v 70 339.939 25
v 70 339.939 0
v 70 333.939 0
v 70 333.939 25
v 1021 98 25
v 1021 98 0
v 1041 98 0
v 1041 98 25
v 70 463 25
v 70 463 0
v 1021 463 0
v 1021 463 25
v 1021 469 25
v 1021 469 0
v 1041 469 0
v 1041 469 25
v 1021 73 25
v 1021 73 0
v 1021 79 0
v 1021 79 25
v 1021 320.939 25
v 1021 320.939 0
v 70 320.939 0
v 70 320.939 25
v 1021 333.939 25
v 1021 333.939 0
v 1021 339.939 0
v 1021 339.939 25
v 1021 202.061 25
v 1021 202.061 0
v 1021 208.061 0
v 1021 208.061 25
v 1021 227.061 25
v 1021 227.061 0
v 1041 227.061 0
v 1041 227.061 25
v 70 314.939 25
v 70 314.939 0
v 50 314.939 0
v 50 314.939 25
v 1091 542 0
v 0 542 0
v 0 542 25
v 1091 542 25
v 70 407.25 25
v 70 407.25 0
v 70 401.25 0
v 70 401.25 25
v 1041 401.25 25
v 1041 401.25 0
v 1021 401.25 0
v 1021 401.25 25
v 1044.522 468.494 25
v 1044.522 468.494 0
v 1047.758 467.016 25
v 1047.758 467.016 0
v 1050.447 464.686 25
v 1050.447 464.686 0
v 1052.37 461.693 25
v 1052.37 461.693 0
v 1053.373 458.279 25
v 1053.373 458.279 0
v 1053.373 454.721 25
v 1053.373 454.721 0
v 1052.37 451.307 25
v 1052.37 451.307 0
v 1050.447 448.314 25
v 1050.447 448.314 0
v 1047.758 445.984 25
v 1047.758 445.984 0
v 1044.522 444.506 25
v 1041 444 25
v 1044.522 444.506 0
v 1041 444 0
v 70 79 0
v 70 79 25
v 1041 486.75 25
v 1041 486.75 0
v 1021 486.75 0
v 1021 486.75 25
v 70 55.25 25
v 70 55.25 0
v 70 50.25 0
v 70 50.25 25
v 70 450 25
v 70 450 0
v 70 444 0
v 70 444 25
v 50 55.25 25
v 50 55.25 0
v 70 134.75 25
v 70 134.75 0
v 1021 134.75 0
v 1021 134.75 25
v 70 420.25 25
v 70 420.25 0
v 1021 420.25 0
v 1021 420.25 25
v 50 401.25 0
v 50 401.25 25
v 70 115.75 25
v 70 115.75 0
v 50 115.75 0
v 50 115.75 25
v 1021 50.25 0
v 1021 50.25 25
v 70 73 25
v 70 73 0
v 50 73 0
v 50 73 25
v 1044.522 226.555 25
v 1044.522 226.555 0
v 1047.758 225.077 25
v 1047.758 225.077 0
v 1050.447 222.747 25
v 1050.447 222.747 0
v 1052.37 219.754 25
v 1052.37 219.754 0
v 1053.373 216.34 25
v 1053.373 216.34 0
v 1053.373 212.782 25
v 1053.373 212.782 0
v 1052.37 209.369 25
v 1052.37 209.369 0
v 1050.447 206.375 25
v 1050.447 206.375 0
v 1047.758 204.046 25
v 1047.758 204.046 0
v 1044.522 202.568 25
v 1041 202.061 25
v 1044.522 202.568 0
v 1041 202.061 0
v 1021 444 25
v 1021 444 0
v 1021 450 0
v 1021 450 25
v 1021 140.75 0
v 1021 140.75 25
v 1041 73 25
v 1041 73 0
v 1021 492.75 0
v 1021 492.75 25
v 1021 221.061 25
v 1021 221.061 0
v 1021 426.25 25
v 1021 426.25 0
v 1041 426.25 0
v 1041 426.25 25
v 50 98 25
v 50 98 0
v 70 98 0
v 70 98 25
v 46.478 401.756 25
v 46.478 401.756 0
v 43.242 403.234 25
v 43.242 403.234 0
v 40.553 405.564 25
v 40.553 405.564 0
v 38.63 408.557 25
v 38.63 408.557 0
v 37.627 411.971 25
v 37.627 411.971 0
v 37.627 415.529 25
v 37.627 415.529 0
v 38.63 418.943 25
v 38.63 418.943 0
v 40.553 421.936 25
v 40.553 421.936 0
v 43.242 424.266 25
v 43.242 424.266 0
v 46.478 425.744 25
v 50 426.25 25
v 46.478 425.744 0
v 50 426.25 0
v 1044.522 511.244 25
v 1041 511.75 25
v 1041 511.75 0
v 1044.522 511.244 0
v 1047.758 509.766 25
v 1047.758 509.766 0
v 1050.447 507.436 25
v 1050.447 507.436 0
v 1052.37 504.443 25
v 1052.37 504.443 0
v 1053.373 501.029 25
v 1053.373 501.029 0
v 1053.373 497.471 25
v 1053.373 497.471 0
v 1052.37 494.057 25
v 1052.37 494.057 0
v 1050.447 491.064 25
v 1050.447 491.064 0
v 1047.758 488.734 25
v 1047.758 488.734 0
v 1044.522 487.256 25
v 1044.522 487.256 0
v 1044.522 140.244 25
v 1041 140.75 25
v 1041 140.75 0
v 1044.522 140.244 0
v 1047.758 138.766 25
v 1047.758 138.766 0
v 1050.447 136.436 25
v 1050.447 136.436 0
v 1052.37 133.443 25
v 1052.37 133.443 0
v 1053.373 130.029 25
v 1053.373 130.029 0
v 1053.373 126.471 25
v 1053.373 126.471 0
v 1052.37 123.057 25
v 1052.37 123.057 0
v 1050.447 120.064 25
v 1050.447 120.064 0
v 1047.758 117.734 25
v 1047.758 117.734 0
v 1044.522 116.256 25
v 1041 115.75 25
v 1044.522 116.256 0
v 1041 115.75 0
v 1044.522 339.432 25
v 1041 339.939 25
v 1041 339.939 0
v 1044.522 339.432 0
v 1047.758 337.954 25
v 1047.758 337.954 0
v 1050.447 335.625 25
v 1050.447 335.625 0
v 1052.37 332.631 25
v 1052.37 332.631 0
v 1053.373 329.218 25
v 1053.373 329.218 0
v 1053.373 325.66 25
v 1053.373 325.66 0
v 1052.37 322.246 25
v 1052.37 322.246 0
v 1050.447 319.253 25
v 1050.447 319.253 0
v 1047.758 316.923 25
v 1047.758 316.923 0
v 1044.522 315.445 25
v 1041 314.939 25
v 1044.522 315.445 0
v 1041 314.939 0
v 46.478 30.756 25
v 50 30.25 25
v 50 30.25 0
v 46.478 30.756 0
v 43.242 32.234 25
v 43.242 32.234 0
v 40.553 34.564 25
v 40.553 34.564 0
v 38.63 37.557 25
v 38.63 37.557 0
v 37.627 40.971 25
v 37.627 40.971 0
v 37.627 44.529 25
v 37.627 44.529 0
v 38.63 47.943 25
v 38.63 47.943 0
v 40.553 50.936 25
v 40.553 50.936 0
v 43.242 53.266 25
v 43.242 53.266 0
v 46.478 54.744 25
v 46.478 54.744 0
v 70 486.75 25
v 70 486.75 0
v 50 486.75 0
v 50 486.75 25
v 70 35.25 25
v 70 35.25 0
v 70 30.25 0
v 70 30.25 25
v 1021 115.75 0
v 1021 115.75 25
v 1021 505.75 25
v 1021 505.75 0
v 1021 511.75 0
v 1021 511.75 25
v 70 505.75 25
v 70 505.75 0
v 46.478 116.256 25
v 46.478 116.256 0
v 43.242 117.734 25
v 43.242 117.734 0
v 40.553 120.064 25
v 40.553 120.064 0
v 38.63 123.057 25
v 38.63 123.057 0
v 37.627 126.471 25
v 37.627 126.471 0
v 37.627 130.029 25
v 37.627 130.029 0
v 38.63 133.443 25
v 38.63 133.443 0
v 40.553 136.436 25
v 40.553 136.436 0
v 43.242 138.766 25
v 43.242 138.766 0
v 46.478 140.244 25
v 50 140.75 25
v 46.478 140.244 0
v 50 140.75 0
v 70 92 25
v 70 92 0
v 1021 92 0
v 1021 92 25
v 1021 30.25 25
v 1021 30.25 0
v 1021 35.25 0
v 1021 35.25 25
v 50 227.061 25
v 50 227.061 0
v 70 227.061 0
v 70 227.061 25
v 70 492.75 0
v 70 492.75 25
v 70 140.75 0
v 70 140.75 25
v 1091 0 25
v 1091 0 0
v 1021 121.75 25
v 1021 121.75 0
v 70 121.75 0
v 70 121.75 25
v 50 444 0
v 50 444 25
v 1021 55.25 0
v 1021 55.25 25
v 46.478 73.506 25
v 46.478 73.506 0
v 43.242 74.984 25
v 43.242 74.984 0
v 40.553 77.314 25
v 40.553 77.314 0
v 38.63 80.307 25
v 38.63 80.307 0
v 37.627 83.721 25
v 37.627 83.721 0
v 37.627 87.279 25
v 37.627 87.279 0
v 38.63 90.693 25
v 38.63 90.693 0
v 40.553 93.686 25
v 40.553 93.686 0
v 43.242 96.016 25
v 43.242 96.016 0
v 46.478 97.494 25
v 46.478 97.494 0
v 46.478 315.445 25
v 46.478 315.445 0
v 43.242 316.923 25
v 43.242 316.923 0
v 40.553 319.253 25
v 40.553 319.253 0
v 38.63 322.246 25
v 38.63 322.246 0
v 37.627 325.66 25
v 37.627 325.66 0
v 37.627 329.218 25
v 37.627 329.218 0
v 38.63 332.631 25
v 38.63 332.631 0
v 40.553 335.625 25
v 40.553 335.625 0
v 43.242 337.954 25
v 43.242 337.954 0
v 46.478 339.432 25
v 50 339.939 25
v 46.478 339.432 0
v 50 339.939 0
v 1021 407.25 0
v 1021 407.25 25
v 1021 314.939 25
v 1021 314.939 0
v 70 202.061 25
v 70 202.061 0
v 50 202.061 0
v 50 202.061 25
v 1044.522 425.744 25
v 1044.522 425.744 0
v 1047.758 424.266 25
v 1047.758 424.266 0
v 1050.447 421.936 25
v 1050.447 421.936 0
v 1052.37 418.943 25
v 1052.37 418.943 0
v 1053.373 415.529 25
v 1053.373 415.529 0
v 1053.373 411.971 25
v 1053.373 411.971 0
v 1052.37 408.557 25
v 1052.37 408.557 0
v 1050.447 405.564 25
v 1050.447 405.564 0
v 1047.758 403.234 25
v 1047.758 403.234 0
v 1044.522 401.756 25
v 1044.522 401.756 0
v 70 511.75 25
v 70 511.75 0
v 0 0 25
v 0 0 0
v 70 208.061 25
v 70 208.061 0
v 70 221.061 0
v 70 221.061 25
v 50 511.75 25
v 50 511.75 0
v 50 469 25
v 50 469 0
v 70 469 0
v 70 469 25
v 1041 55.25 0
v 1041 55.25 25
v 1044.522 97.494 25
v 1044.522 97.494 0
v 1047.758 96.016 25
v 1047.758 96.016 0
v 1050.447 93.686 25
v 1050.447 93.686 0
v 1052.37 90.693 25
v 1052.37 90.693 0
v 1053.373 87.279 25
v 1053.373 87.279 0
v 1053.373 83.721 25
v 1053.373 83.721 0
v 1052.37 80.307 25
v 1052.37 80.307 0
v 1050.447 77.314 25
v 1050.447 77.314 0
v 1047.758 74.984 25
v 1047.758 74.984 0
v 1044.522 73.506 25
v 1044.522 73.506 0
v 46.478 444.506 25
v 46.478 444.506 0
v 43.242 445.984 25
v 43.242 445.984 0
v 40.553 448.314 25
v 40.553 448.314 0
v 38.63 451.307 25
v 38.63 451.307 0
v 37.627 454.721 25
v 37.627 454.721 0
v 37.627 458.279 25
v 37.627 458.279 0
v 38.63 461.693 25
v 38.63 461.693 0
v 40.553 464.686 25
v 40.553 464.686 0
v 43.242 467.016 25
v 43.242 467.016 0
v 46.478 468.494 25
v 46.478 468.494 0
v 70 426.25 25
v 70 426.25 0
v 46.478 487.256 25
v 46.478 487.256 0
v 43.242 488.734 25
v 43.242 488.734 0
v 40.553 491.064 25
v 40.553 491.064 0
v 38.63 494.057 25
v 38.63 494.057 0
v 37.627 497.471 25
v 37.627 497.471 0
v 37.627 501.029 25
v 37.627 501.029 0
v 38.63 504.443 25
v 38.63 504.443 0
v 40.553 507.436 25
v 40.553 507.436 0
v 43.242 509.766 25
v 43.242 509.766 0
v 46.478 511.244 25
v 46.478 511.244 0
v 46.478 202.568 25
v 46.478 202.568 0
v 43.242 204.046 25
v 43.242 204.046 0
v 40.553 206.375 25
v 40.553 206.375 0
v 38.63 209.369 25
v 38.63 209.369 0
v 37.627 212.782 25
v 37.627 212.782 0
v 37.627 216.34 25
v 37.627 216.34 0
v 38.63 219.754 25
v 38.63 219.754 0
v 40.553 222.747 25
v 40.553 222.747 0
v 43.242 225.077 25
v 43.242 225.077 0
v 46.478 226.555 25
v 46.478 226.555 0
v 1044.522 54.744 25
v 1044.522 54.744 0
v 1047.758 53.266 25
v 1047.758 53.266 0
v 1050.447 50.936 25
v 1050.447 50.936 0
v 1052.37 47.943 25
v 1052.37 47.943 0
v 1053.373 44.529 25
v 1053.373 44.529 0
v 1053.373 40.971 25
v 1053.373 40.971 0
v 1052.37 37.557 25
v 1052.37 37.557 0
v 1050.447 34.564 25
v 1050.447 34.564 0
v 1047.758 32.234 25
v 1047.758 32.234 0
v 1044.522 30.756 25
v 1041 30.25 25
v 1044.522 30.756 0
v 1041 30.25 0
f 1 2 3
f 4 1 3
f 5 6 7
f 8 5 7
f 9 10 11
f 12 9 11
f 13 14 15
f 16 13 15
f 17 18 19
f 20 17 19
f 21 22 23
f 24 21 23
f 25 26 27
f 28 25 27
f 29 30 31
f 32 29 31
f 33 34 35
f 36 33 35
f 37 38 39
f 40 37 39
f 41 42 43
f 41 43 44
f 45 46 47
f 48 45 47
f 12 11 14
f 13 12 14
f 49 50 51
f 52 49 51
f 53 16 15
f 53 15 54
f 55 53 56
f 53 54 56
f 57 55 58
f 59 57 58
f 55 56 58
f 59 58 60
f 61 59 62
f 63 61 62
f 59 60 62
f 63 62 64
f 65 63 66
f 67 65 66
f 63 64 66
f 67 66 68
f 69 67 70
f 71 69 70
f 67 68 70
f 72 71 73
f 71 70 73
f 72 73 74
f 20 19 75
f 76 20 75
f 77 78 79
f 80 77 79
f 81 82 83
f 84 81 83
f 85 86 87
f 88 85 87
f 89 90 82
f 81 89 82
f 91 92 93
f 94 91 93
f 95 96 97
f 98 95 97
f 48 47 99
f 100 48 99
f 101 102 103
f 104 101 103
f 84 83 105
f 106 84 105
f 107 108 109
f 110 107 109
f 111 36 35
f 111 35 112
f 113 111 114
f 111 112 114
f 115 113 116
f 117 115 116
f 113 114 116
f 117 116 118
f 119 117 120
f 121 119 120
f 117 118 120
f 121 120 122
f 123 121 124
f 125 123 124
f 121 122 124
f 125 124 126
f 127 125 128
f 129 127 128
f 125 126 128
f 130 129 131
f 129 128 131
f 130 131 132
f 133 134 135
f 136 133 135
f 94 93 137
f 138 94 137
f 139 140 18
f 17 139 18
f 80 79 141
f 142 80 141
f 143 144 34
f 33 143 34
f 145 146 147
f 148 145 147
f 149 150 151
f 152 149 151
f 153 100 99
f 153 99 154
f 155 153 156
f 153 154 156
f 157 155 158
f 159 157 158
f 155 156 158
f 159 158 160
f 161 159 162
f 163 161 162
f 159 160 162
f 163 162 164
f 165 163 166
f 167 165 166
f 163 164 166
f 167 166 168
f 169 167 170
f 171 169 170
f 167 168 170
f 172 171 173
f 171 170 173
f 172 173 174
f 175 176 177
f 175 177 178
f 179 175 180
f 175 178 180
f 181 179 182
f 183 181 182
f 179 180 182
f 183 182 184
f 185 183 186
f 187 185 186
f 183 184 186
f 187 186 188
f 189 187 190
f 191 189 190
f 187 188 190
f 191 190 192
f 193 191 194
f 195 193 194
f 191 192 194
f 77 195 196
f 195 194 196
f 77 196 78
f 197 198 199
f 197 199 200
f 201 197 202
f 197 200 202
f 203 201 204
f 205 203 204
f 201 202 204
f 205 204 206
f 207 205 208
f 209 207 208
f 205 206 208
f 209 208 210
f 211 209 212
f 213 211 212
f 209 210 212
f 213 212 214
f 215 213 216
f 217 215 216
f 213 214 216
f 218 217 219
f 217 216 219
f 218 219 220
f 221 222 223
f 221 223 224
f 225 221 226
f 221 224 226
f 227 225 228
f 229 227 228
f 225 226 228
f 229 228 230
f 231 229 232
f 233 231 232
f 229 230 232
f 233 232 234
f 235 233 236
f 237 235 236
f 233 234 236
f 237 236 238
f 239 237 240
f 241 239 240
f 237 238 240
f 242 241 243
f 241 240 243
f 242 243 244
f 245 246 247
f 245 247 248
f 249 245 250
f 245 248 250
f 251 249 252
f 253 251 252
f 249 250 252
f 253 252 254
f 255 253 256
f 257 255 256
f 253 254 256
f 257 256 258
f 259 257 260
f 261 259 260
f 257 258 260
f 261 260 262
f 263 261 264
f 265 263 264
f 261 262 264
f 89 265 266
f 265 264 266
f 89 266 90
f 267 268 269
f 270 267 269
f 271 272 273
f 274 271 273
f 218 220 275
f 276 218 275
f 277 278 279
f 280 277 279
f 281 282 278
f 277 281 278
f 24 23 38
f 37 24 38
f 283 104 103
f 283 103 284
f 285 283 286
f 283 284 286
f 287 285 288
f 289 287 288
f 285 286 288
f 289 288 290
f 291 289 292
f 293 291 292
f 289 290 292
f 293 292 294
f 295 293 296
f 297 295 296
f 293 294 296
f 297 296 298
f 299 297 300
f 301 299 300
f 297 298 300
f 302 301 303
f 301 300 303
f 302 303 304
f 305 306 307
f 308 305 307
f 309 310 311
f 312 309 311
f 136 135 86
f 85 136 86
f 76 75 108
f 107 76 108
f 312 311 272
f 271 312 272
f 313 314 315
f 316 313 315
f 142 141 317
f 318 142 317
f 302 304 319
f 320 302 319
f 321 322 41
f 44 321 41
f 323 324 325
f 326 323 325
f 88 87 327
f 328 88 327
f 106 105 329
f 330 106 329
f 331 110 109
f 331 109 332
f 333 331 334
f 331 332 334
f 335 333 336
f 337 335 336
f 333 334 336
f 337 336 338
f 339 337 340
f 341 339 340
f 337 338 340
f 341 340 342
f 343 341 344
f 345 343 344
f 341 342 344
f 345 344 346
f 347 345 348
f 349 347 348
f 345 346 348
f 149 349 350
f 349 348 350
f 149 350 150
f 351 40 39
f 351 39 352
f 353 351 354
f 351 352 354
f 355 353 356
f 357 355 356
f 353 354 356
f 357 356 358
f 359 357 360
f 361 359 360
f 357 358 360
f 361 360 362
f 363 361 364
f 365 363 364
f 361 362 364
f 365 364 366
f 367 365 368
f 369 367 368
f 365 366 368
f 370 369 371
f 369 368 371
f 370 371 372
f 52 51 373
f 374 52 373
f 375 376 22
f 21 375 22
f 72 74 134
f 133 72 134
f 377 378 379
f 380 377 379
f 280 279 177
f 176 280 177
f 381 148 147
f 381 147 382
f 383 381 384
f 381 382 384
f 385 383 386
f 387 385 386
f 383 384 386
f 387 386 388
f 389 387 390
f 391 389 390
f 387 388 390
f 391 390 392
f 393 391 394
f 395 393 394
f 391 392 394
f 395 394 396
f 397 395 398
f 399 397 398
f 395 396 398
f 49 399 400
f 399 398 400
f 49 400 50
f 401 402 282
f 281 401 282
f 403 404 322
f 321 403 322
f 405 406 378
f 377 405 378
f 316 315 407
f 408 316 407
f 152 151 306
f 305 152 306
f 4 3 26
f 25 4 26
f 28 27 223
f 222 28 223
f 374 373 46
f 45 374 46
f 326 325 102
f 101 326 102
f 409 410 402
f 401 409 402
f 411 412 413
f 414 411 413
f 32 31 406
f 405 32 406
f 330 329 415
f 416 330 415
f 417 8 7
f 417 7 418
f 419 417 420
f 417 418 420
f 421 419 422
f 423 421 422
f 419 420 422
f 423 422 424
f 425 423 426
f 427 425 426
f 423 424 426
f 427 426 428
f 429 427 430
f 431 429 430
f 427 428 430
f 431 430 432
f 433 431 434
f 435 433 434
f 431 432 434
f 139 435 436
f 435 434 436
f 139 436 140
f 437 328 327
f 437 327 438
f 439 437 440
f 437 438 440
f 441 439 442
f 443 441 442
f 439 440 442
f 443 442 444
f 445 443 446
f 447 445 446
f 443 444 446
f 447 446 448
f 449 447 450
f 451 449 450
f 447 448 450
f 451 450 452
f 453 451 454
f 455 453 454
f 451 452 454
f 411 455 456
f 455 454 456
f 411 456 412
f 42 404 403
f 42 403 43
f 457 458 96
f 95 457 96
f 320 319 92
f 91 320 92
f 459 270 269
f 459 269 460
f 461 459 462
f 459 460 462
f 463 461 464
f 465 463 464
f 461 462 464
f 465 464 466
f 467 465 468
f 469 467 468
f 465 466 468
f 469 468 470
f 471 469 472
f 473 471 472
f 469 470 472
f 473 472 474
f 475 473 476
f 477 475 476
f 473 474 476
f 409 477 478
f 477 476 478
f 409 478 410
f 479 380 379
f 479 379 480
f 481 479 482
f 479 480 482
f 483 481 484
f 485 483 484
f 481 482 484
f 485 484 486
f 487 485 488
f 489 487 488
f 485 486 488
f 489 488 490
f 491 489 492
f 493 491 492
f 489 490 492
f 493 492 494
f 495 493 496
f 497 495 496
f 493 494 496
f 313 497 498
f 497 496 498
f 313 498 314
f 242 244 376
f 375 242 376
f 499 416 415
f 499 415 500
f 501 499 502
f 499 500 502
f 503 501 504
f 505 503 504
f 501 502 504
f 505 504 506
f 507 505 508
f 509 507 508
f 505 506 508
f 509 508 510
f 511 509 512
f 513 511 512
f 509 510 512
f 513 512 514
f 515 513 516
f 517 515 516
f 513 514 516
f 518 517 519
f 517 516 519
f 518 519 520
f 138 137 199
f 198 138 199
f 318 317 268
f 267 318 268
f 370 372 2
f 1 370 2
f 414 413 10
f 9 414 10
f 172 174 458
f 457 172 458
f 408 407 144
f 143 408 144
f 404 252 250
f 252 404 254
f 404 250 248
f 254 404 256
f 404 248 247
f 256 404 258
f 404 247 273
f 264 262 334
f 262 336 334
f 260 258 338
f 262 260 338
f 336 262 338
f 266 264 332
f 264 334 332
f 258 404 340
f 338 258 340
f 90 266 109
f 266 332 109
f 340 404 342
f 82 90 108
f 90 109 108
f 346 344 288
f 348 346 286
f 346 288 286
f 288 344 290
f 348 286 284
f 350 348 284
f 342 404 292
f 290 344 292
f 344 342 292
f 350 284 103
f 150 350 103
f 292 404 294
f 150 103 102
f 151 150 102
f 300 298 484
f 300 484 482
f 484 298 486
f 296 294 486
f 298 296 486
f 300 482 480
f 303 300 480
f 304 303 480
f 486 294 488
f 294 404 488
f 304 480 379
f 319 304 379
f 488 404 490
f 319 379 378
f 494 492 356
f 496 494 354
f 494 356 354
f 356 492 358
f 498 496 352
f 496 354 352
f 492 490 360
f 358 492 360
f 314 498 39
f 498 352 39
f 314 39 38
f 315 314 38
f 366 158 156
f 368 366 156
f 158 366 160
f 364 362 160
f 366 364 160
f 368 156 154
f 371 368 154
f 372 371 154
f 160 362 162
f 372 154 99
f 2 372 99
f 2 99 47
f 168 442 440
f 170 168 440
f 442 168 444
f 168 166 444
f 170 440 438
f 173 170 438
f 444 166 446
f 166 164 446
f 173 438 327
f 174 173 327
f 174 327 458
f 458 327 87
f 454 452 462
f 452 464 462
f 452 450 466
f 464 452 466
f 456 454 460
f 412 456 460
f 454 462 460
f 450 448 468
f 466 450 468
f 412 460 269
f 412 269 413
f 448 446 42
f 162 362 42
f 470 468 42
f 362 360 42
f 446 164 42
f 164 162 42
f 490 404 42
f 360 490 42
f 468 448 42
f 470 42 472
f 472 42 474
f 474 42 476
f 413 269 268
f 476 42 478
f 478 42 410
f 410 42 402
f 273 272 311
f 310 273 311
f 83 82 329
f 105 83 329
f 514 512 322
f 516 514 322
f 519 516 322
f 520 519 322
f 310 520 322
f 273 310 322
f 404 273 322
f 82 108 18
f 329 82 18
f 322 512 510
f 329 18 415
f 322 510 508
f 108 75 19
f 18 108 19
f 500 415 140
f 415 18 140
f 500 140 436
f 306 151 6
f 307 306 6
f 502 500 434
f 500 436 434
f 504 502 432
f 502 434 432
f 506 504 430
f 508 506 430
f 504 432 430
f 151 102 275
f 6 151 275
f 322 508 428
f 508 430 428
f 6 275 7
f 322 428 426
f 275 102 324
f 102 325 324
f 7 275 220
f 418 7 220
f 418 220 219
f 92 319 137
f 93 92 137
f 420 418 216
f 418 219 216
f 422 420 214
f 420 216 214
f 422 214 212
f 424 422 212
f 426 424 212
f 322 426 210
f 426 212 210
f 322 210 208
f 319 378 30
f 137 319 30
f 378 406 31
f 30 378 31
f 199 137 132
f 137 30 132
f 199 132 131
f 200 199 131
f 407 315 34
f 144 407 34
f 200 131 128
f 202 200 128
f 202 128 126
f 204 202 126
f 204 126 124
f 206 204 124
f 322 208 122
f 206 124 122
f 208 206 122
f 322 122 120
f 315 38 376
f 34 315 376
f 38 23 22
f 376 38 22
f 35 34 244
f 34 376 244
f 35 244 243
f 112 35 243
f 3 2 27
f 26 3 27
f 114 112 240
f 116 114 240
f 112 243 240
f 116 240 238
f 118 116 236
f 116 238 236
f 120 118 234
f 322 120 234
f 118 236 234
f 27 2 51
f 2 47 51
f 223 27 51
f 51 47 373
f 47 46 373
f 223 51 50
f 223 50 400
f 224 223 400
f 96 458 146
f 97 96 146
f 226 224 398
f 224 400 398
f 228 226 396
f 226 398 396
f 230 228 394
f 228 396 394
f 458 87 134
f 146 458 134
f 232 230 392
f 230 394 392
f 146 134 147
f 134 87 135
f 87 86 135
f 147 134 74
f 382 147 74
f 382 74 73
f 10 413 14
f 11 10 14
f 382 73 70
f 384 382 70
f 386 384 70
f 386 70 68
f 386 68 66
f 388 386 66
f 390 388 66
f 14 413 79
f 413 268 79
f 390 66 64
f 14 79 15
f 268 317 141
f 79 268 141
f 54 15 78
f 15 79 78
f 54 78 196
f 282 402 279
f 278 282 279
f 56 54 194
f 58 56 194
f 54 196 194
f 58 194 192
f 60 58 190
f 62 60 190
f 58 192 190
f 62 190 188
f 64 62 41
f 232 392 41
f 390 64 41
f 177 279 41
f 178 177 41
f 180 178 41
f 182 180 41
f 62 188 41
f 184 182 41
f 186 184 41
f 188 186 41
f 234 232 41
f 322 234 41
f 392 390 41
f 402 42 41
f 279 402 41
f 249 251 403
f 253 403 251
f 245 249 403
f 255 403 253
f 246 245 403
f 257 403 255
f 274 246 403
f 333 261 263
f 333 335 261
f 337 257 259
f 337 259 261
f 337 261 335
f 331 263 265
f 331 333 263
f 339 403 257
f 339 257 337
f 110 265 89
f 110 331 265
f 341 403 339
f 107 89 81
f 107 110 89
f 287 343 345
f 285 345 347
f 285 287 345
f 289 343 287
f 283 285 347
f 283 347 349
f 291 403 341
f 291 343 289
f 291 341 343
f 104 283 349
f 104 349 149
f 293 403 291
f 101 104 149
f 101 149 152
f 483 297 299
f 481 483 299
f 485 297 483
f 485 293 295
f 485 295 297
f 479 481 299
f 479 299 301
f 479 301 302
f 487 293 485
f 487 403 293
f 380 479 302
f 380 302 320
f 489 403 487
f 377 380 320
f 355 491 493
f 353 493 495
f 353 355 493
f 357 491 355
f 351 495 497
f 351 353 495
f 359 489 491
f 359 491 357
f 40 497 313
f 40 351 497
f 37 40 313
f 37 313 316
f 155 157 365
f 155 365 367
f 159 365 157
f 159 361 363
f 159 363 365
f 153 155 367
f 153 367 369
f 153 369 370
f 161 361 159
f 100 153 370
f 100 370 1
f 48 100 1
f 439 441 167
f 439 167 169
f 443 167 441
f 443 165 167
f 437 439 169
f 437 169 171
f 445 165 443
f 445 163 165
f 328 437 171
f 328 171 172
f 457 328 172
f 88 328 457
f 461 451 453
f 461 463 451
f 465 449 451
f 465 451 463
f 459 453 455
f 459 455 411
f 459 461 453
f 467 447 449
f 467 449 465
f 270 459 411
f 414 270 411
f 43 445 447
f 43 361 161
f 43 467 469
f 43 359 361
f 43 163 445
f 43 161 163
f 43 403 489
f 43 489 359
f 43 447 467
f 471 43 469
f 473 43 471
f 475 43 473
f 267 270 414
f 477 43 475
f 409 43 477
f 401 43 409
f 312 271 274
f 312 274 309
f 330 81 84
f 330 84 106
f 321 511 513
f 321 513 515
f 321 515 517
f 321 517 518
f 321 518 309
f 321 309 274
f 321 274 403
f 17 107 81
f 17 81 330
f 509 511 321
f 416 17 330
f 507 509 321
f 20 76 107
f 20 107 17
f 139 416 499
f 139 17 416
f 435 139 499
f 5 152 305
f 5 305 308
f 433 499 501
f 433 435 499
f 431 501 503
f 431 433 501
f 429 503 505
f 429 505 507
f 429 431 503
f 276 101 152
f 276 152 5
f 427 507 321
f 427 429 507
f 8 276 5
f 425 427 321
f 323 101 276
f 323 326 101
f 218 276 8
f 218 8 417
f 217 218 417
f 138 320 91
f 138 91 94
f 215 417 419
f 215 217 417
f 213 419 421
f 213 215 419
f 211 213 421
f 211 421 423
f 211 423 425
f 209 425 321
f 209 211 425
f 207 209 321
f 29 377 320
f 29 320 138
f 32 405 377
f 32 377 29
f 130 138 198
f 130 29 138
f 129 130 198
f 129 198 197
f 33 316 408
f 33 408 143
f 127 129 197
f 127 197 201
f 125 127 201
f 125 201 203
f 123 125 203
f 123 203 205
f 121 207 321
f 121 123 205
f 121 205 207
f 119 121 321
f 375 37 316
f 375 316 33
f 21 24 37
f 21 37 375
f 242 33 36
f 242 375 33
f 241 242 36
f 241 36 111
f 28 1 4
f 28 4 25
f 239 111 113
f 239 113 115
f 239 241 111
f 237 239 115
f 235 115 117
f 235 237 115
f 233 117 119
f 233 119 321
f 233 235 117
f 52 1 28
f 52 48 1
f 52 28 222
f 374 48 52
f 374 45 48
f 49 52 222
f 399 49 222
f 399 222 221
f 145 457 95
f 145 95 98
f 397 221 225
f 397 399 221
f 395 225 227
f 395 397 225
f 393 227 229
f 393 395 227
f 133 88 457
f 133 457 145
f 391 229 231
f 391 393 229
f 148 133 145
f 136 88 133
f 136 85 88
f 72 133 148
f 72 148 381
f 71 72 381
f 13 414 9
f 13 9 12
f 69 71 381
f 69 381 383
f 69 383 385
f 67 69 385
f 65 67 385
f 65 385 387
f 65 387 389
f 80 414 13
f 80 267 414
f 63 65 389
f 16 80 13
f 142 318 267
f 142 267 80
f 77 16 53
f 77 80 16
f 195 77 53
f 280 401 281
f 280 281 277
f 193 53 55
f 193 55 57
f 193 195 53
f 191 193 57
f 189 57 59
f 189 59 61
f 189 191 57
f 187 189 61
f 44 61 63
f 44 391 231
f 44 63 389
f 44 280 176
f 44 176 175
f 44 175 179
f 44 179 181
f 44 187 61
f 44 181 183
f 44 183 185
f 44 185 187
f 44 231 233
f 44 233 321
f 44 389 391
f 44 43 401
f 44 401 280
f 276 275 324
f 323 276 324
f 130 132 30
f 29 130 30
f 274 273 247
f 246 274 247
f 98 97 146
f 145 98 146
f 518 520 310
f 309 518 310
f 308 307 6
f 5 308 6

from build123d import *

# Parameters (mm, degrees)
F1_W     = 1091
F1_H     = 542
F2_DEPTH = 25


with BuildPart() as f2:
    # F1 (on face) → F2 (new body)
    with BuildSketch(Plane.XY):
        with Locations((545.5, 271)):
            Rectangle(F1_W, F1_H)
        with BuildLine():
            Line((70, 30.25), (50, 30.25))
            ThreePointArc((50, 30.25), (37.5, 42.75), (50, 55.25))
            Line((50, 55.25), (70, 55.25))
            Line((70, 55.25), (70, 50.25))
            Line((70, 50.25), (1021, 50.25))
            Line((1021, 50.25), (1021, 55.25))
            Line((1021, 55.25), (1041, 55.25))
            ThreePointArc((1041, 55.25), (1053.5, 42.75), (1041, 30.25))
            Line((1041, 30.25), (1021, 30.25))
            Line((1021, 30.25), (1021, 35.25))
            Line((1021, 35.25), (70, 35.25))
            Line((70, 35.25), (70, 30.25))
        make_face(mode=Mode.SUBTRACT)
        with BuildLine():
            Line((70, 73), (50, 73))
            ThreePointArc((50, 73), (37.5, 85.5), (50, 98))
            Line((50, 98), (70, 98))
            Line((70, 98), (70, 92))
            Line((70, 92), (1021, 92))
            Line((1021, 92), (1021, 98))
            Line((1021, 98), (1041, 98))
            ThreePointArc((1041, 98), (1053.5, 85.5), (1041, 73))
            Line((1041, 73), (1021, 73))
            Line((1021, 73), (1021, 79))
            Line((1021, 79), (70, 79))
            Line((70, 79), (70, 73))
        make_face(mode=Mode.SUBTRACT)
        with BuildLine():
            Line((70, 115.75), (50, 115.75))
            ThreePointArc((50, 115.75), (37.5, 128.25), (50, 140.75))
            Line((50, 140.75), (70, 140.75))
            Line((70, 140.75), (70, 134.75))
            Line((70, 134.75), (1021, 134.75))
            Line((1021, 134.75), (1021, 140.75))
            Line((1021, 140.75), (1041, 140.75))
            ThreePointArc((1041, 140.75), (1053.5, 128.25), (1041, 115.75))
            Line((1041, 115.75), (1021, 115.75))
            Line((1021, 115.75), (1021, 121.75))
            Line((1021, 121.75), (70, 121.75))
            Line((70, 121.75), (70, 115.75))
        make_face(mode=Mode.SUBTRACT)
        with BuildLine():
            Line((70, 202.061247), (50, 202.061247))
            ThreePointArc((50, 202.061247), (37.5, 214.561247), (50, 227.061247))
            Line((50, 227.061247), (70, 227.061247))
            Line((70, 227.061247), (70, 221.061247))
            Line((70, 221.061247), (1021, 221.061247))
            Line((1021, 221.061247), (1021, 227.061247))
            Line((1021, 227.061247), (1041, 227.061247))
            ThreePointArc((1041, 227.061247), (1053.5, 214.561247), (1041, 202.061247))
            Line((1041, 202.061247), (1021, 202.061247))
            Line((1021, 202.061247), (1021, 208.061247))
            Line((1021, 208.061247), (70, 208.061247))
            Line((70, 208.061247), (70, 202.061247))
        make_face(mode=Mode.SUBTRACT)
        with BuildLine():
            Line((70, 314.938753), (50, 314.938753))
            ThreePointArc((50, 314.938753), (37.5, 327.438753), (50, 339.938753))
            Line((50, 339.938753), (70, 339.938753))
            Line((70, 339.938753), (70, 333.938753))
            Line((70, 333.938753), (1021, 333.938753))
            Line((1021, 333.938753), (1021, 339.938753))
            Line((1021, 339.938753), (1041, 339.938753))
            ThreePointArc((1041, 339.938753), (1053.5, 327.438753), (1041, 314.938753))
            Line((1041, 314.938753), (1021, 314.938753))
            Line((1021, 314.938753), (1021, 320.938753))
            Line((1021, 320.938753), (70, 320.938753))
            Line((70, 320.938753), (70, 314.938753))
        make_face(mode=Mode.SUBTRACT)
        with BuildLine():
            Line((70, 401.25), (50, 401.25))
            ThreePointArc((50, 401.25), (37.5, 413.75), (50, 426.25))
            Line((50, 426.25), (70, 426.25))
            Line((70, 426.25), (70, 420.25))
            Line((70, 420.25), (1021, 420.25))
            Line((1021, 420.25), (1021, 426.25))
            Line((1021, 426.25), (1041, 426.25))
            ThreePointArc((1041, 426.25), (1053.5, 413.75), (1041, 401.25))
            Line((1041, 401.25), (1021, 401.25))
            Line((1021, 401.25), (1021, 407.25))
            Line((1021, 407.25), (70, 407.25))
            Line((70, 407.25), (70, 401.25))
        make_face(mode=Mode.SUBTRACT)
        with BuildLine():
            Line((70, 444), (50, 444))
            ThreePointArc((50, 444), (37.5, 456.5), (50, 469))
            Line((50, 469), (70, 469))
            Line((70, 469), (70, 463))
            Line((70, 463), (1021, 463))
            Line((1021, 463), (1021, 469))
            Line((1021, 469), (1041, 469))
            ThreePointArc((1041, 469), (1053.5, 456.5), (1041, 444))
            Line((1041, 444), (1021, 444))
            Line((1021, 444), (1021, 450))
            Line((1021, 450), (70, 450))
            Line((70, 450), (70, 444))
        make_face(mode=Mode.SUBTRACT)
        with BuildLine():
            Line((70, 486.75), (50, 486.75))
            ThreePointArc((50, 486.75), (37.5, 499.25), (50, 511.75))
            Line((50, 511.75), (70, 511.75))
            Line((70, 511.75), (70, 505.75))
            Line((70, 505.75), (1021, 505.75))
            Line((1021, 505.75), (1021, 511.75))
            Line((1021, 511.75), (1041, 511.75))
            ThreePointArc((1041, 511.75), (1053.5, 499.25), (1041, 486.75))
            Line((1041, 486.75), (1021, 486.75))
            Line((1021, 486.75), (1021, 492.75))
            Line((1021, 492.75), (70, 492.75))
            Line((70, 492.75), (70, 486.75))
        make_face(mode=Mode.SUBTRACT)
    extrude(amount=F2_DEPTH)


solid = f2.part
